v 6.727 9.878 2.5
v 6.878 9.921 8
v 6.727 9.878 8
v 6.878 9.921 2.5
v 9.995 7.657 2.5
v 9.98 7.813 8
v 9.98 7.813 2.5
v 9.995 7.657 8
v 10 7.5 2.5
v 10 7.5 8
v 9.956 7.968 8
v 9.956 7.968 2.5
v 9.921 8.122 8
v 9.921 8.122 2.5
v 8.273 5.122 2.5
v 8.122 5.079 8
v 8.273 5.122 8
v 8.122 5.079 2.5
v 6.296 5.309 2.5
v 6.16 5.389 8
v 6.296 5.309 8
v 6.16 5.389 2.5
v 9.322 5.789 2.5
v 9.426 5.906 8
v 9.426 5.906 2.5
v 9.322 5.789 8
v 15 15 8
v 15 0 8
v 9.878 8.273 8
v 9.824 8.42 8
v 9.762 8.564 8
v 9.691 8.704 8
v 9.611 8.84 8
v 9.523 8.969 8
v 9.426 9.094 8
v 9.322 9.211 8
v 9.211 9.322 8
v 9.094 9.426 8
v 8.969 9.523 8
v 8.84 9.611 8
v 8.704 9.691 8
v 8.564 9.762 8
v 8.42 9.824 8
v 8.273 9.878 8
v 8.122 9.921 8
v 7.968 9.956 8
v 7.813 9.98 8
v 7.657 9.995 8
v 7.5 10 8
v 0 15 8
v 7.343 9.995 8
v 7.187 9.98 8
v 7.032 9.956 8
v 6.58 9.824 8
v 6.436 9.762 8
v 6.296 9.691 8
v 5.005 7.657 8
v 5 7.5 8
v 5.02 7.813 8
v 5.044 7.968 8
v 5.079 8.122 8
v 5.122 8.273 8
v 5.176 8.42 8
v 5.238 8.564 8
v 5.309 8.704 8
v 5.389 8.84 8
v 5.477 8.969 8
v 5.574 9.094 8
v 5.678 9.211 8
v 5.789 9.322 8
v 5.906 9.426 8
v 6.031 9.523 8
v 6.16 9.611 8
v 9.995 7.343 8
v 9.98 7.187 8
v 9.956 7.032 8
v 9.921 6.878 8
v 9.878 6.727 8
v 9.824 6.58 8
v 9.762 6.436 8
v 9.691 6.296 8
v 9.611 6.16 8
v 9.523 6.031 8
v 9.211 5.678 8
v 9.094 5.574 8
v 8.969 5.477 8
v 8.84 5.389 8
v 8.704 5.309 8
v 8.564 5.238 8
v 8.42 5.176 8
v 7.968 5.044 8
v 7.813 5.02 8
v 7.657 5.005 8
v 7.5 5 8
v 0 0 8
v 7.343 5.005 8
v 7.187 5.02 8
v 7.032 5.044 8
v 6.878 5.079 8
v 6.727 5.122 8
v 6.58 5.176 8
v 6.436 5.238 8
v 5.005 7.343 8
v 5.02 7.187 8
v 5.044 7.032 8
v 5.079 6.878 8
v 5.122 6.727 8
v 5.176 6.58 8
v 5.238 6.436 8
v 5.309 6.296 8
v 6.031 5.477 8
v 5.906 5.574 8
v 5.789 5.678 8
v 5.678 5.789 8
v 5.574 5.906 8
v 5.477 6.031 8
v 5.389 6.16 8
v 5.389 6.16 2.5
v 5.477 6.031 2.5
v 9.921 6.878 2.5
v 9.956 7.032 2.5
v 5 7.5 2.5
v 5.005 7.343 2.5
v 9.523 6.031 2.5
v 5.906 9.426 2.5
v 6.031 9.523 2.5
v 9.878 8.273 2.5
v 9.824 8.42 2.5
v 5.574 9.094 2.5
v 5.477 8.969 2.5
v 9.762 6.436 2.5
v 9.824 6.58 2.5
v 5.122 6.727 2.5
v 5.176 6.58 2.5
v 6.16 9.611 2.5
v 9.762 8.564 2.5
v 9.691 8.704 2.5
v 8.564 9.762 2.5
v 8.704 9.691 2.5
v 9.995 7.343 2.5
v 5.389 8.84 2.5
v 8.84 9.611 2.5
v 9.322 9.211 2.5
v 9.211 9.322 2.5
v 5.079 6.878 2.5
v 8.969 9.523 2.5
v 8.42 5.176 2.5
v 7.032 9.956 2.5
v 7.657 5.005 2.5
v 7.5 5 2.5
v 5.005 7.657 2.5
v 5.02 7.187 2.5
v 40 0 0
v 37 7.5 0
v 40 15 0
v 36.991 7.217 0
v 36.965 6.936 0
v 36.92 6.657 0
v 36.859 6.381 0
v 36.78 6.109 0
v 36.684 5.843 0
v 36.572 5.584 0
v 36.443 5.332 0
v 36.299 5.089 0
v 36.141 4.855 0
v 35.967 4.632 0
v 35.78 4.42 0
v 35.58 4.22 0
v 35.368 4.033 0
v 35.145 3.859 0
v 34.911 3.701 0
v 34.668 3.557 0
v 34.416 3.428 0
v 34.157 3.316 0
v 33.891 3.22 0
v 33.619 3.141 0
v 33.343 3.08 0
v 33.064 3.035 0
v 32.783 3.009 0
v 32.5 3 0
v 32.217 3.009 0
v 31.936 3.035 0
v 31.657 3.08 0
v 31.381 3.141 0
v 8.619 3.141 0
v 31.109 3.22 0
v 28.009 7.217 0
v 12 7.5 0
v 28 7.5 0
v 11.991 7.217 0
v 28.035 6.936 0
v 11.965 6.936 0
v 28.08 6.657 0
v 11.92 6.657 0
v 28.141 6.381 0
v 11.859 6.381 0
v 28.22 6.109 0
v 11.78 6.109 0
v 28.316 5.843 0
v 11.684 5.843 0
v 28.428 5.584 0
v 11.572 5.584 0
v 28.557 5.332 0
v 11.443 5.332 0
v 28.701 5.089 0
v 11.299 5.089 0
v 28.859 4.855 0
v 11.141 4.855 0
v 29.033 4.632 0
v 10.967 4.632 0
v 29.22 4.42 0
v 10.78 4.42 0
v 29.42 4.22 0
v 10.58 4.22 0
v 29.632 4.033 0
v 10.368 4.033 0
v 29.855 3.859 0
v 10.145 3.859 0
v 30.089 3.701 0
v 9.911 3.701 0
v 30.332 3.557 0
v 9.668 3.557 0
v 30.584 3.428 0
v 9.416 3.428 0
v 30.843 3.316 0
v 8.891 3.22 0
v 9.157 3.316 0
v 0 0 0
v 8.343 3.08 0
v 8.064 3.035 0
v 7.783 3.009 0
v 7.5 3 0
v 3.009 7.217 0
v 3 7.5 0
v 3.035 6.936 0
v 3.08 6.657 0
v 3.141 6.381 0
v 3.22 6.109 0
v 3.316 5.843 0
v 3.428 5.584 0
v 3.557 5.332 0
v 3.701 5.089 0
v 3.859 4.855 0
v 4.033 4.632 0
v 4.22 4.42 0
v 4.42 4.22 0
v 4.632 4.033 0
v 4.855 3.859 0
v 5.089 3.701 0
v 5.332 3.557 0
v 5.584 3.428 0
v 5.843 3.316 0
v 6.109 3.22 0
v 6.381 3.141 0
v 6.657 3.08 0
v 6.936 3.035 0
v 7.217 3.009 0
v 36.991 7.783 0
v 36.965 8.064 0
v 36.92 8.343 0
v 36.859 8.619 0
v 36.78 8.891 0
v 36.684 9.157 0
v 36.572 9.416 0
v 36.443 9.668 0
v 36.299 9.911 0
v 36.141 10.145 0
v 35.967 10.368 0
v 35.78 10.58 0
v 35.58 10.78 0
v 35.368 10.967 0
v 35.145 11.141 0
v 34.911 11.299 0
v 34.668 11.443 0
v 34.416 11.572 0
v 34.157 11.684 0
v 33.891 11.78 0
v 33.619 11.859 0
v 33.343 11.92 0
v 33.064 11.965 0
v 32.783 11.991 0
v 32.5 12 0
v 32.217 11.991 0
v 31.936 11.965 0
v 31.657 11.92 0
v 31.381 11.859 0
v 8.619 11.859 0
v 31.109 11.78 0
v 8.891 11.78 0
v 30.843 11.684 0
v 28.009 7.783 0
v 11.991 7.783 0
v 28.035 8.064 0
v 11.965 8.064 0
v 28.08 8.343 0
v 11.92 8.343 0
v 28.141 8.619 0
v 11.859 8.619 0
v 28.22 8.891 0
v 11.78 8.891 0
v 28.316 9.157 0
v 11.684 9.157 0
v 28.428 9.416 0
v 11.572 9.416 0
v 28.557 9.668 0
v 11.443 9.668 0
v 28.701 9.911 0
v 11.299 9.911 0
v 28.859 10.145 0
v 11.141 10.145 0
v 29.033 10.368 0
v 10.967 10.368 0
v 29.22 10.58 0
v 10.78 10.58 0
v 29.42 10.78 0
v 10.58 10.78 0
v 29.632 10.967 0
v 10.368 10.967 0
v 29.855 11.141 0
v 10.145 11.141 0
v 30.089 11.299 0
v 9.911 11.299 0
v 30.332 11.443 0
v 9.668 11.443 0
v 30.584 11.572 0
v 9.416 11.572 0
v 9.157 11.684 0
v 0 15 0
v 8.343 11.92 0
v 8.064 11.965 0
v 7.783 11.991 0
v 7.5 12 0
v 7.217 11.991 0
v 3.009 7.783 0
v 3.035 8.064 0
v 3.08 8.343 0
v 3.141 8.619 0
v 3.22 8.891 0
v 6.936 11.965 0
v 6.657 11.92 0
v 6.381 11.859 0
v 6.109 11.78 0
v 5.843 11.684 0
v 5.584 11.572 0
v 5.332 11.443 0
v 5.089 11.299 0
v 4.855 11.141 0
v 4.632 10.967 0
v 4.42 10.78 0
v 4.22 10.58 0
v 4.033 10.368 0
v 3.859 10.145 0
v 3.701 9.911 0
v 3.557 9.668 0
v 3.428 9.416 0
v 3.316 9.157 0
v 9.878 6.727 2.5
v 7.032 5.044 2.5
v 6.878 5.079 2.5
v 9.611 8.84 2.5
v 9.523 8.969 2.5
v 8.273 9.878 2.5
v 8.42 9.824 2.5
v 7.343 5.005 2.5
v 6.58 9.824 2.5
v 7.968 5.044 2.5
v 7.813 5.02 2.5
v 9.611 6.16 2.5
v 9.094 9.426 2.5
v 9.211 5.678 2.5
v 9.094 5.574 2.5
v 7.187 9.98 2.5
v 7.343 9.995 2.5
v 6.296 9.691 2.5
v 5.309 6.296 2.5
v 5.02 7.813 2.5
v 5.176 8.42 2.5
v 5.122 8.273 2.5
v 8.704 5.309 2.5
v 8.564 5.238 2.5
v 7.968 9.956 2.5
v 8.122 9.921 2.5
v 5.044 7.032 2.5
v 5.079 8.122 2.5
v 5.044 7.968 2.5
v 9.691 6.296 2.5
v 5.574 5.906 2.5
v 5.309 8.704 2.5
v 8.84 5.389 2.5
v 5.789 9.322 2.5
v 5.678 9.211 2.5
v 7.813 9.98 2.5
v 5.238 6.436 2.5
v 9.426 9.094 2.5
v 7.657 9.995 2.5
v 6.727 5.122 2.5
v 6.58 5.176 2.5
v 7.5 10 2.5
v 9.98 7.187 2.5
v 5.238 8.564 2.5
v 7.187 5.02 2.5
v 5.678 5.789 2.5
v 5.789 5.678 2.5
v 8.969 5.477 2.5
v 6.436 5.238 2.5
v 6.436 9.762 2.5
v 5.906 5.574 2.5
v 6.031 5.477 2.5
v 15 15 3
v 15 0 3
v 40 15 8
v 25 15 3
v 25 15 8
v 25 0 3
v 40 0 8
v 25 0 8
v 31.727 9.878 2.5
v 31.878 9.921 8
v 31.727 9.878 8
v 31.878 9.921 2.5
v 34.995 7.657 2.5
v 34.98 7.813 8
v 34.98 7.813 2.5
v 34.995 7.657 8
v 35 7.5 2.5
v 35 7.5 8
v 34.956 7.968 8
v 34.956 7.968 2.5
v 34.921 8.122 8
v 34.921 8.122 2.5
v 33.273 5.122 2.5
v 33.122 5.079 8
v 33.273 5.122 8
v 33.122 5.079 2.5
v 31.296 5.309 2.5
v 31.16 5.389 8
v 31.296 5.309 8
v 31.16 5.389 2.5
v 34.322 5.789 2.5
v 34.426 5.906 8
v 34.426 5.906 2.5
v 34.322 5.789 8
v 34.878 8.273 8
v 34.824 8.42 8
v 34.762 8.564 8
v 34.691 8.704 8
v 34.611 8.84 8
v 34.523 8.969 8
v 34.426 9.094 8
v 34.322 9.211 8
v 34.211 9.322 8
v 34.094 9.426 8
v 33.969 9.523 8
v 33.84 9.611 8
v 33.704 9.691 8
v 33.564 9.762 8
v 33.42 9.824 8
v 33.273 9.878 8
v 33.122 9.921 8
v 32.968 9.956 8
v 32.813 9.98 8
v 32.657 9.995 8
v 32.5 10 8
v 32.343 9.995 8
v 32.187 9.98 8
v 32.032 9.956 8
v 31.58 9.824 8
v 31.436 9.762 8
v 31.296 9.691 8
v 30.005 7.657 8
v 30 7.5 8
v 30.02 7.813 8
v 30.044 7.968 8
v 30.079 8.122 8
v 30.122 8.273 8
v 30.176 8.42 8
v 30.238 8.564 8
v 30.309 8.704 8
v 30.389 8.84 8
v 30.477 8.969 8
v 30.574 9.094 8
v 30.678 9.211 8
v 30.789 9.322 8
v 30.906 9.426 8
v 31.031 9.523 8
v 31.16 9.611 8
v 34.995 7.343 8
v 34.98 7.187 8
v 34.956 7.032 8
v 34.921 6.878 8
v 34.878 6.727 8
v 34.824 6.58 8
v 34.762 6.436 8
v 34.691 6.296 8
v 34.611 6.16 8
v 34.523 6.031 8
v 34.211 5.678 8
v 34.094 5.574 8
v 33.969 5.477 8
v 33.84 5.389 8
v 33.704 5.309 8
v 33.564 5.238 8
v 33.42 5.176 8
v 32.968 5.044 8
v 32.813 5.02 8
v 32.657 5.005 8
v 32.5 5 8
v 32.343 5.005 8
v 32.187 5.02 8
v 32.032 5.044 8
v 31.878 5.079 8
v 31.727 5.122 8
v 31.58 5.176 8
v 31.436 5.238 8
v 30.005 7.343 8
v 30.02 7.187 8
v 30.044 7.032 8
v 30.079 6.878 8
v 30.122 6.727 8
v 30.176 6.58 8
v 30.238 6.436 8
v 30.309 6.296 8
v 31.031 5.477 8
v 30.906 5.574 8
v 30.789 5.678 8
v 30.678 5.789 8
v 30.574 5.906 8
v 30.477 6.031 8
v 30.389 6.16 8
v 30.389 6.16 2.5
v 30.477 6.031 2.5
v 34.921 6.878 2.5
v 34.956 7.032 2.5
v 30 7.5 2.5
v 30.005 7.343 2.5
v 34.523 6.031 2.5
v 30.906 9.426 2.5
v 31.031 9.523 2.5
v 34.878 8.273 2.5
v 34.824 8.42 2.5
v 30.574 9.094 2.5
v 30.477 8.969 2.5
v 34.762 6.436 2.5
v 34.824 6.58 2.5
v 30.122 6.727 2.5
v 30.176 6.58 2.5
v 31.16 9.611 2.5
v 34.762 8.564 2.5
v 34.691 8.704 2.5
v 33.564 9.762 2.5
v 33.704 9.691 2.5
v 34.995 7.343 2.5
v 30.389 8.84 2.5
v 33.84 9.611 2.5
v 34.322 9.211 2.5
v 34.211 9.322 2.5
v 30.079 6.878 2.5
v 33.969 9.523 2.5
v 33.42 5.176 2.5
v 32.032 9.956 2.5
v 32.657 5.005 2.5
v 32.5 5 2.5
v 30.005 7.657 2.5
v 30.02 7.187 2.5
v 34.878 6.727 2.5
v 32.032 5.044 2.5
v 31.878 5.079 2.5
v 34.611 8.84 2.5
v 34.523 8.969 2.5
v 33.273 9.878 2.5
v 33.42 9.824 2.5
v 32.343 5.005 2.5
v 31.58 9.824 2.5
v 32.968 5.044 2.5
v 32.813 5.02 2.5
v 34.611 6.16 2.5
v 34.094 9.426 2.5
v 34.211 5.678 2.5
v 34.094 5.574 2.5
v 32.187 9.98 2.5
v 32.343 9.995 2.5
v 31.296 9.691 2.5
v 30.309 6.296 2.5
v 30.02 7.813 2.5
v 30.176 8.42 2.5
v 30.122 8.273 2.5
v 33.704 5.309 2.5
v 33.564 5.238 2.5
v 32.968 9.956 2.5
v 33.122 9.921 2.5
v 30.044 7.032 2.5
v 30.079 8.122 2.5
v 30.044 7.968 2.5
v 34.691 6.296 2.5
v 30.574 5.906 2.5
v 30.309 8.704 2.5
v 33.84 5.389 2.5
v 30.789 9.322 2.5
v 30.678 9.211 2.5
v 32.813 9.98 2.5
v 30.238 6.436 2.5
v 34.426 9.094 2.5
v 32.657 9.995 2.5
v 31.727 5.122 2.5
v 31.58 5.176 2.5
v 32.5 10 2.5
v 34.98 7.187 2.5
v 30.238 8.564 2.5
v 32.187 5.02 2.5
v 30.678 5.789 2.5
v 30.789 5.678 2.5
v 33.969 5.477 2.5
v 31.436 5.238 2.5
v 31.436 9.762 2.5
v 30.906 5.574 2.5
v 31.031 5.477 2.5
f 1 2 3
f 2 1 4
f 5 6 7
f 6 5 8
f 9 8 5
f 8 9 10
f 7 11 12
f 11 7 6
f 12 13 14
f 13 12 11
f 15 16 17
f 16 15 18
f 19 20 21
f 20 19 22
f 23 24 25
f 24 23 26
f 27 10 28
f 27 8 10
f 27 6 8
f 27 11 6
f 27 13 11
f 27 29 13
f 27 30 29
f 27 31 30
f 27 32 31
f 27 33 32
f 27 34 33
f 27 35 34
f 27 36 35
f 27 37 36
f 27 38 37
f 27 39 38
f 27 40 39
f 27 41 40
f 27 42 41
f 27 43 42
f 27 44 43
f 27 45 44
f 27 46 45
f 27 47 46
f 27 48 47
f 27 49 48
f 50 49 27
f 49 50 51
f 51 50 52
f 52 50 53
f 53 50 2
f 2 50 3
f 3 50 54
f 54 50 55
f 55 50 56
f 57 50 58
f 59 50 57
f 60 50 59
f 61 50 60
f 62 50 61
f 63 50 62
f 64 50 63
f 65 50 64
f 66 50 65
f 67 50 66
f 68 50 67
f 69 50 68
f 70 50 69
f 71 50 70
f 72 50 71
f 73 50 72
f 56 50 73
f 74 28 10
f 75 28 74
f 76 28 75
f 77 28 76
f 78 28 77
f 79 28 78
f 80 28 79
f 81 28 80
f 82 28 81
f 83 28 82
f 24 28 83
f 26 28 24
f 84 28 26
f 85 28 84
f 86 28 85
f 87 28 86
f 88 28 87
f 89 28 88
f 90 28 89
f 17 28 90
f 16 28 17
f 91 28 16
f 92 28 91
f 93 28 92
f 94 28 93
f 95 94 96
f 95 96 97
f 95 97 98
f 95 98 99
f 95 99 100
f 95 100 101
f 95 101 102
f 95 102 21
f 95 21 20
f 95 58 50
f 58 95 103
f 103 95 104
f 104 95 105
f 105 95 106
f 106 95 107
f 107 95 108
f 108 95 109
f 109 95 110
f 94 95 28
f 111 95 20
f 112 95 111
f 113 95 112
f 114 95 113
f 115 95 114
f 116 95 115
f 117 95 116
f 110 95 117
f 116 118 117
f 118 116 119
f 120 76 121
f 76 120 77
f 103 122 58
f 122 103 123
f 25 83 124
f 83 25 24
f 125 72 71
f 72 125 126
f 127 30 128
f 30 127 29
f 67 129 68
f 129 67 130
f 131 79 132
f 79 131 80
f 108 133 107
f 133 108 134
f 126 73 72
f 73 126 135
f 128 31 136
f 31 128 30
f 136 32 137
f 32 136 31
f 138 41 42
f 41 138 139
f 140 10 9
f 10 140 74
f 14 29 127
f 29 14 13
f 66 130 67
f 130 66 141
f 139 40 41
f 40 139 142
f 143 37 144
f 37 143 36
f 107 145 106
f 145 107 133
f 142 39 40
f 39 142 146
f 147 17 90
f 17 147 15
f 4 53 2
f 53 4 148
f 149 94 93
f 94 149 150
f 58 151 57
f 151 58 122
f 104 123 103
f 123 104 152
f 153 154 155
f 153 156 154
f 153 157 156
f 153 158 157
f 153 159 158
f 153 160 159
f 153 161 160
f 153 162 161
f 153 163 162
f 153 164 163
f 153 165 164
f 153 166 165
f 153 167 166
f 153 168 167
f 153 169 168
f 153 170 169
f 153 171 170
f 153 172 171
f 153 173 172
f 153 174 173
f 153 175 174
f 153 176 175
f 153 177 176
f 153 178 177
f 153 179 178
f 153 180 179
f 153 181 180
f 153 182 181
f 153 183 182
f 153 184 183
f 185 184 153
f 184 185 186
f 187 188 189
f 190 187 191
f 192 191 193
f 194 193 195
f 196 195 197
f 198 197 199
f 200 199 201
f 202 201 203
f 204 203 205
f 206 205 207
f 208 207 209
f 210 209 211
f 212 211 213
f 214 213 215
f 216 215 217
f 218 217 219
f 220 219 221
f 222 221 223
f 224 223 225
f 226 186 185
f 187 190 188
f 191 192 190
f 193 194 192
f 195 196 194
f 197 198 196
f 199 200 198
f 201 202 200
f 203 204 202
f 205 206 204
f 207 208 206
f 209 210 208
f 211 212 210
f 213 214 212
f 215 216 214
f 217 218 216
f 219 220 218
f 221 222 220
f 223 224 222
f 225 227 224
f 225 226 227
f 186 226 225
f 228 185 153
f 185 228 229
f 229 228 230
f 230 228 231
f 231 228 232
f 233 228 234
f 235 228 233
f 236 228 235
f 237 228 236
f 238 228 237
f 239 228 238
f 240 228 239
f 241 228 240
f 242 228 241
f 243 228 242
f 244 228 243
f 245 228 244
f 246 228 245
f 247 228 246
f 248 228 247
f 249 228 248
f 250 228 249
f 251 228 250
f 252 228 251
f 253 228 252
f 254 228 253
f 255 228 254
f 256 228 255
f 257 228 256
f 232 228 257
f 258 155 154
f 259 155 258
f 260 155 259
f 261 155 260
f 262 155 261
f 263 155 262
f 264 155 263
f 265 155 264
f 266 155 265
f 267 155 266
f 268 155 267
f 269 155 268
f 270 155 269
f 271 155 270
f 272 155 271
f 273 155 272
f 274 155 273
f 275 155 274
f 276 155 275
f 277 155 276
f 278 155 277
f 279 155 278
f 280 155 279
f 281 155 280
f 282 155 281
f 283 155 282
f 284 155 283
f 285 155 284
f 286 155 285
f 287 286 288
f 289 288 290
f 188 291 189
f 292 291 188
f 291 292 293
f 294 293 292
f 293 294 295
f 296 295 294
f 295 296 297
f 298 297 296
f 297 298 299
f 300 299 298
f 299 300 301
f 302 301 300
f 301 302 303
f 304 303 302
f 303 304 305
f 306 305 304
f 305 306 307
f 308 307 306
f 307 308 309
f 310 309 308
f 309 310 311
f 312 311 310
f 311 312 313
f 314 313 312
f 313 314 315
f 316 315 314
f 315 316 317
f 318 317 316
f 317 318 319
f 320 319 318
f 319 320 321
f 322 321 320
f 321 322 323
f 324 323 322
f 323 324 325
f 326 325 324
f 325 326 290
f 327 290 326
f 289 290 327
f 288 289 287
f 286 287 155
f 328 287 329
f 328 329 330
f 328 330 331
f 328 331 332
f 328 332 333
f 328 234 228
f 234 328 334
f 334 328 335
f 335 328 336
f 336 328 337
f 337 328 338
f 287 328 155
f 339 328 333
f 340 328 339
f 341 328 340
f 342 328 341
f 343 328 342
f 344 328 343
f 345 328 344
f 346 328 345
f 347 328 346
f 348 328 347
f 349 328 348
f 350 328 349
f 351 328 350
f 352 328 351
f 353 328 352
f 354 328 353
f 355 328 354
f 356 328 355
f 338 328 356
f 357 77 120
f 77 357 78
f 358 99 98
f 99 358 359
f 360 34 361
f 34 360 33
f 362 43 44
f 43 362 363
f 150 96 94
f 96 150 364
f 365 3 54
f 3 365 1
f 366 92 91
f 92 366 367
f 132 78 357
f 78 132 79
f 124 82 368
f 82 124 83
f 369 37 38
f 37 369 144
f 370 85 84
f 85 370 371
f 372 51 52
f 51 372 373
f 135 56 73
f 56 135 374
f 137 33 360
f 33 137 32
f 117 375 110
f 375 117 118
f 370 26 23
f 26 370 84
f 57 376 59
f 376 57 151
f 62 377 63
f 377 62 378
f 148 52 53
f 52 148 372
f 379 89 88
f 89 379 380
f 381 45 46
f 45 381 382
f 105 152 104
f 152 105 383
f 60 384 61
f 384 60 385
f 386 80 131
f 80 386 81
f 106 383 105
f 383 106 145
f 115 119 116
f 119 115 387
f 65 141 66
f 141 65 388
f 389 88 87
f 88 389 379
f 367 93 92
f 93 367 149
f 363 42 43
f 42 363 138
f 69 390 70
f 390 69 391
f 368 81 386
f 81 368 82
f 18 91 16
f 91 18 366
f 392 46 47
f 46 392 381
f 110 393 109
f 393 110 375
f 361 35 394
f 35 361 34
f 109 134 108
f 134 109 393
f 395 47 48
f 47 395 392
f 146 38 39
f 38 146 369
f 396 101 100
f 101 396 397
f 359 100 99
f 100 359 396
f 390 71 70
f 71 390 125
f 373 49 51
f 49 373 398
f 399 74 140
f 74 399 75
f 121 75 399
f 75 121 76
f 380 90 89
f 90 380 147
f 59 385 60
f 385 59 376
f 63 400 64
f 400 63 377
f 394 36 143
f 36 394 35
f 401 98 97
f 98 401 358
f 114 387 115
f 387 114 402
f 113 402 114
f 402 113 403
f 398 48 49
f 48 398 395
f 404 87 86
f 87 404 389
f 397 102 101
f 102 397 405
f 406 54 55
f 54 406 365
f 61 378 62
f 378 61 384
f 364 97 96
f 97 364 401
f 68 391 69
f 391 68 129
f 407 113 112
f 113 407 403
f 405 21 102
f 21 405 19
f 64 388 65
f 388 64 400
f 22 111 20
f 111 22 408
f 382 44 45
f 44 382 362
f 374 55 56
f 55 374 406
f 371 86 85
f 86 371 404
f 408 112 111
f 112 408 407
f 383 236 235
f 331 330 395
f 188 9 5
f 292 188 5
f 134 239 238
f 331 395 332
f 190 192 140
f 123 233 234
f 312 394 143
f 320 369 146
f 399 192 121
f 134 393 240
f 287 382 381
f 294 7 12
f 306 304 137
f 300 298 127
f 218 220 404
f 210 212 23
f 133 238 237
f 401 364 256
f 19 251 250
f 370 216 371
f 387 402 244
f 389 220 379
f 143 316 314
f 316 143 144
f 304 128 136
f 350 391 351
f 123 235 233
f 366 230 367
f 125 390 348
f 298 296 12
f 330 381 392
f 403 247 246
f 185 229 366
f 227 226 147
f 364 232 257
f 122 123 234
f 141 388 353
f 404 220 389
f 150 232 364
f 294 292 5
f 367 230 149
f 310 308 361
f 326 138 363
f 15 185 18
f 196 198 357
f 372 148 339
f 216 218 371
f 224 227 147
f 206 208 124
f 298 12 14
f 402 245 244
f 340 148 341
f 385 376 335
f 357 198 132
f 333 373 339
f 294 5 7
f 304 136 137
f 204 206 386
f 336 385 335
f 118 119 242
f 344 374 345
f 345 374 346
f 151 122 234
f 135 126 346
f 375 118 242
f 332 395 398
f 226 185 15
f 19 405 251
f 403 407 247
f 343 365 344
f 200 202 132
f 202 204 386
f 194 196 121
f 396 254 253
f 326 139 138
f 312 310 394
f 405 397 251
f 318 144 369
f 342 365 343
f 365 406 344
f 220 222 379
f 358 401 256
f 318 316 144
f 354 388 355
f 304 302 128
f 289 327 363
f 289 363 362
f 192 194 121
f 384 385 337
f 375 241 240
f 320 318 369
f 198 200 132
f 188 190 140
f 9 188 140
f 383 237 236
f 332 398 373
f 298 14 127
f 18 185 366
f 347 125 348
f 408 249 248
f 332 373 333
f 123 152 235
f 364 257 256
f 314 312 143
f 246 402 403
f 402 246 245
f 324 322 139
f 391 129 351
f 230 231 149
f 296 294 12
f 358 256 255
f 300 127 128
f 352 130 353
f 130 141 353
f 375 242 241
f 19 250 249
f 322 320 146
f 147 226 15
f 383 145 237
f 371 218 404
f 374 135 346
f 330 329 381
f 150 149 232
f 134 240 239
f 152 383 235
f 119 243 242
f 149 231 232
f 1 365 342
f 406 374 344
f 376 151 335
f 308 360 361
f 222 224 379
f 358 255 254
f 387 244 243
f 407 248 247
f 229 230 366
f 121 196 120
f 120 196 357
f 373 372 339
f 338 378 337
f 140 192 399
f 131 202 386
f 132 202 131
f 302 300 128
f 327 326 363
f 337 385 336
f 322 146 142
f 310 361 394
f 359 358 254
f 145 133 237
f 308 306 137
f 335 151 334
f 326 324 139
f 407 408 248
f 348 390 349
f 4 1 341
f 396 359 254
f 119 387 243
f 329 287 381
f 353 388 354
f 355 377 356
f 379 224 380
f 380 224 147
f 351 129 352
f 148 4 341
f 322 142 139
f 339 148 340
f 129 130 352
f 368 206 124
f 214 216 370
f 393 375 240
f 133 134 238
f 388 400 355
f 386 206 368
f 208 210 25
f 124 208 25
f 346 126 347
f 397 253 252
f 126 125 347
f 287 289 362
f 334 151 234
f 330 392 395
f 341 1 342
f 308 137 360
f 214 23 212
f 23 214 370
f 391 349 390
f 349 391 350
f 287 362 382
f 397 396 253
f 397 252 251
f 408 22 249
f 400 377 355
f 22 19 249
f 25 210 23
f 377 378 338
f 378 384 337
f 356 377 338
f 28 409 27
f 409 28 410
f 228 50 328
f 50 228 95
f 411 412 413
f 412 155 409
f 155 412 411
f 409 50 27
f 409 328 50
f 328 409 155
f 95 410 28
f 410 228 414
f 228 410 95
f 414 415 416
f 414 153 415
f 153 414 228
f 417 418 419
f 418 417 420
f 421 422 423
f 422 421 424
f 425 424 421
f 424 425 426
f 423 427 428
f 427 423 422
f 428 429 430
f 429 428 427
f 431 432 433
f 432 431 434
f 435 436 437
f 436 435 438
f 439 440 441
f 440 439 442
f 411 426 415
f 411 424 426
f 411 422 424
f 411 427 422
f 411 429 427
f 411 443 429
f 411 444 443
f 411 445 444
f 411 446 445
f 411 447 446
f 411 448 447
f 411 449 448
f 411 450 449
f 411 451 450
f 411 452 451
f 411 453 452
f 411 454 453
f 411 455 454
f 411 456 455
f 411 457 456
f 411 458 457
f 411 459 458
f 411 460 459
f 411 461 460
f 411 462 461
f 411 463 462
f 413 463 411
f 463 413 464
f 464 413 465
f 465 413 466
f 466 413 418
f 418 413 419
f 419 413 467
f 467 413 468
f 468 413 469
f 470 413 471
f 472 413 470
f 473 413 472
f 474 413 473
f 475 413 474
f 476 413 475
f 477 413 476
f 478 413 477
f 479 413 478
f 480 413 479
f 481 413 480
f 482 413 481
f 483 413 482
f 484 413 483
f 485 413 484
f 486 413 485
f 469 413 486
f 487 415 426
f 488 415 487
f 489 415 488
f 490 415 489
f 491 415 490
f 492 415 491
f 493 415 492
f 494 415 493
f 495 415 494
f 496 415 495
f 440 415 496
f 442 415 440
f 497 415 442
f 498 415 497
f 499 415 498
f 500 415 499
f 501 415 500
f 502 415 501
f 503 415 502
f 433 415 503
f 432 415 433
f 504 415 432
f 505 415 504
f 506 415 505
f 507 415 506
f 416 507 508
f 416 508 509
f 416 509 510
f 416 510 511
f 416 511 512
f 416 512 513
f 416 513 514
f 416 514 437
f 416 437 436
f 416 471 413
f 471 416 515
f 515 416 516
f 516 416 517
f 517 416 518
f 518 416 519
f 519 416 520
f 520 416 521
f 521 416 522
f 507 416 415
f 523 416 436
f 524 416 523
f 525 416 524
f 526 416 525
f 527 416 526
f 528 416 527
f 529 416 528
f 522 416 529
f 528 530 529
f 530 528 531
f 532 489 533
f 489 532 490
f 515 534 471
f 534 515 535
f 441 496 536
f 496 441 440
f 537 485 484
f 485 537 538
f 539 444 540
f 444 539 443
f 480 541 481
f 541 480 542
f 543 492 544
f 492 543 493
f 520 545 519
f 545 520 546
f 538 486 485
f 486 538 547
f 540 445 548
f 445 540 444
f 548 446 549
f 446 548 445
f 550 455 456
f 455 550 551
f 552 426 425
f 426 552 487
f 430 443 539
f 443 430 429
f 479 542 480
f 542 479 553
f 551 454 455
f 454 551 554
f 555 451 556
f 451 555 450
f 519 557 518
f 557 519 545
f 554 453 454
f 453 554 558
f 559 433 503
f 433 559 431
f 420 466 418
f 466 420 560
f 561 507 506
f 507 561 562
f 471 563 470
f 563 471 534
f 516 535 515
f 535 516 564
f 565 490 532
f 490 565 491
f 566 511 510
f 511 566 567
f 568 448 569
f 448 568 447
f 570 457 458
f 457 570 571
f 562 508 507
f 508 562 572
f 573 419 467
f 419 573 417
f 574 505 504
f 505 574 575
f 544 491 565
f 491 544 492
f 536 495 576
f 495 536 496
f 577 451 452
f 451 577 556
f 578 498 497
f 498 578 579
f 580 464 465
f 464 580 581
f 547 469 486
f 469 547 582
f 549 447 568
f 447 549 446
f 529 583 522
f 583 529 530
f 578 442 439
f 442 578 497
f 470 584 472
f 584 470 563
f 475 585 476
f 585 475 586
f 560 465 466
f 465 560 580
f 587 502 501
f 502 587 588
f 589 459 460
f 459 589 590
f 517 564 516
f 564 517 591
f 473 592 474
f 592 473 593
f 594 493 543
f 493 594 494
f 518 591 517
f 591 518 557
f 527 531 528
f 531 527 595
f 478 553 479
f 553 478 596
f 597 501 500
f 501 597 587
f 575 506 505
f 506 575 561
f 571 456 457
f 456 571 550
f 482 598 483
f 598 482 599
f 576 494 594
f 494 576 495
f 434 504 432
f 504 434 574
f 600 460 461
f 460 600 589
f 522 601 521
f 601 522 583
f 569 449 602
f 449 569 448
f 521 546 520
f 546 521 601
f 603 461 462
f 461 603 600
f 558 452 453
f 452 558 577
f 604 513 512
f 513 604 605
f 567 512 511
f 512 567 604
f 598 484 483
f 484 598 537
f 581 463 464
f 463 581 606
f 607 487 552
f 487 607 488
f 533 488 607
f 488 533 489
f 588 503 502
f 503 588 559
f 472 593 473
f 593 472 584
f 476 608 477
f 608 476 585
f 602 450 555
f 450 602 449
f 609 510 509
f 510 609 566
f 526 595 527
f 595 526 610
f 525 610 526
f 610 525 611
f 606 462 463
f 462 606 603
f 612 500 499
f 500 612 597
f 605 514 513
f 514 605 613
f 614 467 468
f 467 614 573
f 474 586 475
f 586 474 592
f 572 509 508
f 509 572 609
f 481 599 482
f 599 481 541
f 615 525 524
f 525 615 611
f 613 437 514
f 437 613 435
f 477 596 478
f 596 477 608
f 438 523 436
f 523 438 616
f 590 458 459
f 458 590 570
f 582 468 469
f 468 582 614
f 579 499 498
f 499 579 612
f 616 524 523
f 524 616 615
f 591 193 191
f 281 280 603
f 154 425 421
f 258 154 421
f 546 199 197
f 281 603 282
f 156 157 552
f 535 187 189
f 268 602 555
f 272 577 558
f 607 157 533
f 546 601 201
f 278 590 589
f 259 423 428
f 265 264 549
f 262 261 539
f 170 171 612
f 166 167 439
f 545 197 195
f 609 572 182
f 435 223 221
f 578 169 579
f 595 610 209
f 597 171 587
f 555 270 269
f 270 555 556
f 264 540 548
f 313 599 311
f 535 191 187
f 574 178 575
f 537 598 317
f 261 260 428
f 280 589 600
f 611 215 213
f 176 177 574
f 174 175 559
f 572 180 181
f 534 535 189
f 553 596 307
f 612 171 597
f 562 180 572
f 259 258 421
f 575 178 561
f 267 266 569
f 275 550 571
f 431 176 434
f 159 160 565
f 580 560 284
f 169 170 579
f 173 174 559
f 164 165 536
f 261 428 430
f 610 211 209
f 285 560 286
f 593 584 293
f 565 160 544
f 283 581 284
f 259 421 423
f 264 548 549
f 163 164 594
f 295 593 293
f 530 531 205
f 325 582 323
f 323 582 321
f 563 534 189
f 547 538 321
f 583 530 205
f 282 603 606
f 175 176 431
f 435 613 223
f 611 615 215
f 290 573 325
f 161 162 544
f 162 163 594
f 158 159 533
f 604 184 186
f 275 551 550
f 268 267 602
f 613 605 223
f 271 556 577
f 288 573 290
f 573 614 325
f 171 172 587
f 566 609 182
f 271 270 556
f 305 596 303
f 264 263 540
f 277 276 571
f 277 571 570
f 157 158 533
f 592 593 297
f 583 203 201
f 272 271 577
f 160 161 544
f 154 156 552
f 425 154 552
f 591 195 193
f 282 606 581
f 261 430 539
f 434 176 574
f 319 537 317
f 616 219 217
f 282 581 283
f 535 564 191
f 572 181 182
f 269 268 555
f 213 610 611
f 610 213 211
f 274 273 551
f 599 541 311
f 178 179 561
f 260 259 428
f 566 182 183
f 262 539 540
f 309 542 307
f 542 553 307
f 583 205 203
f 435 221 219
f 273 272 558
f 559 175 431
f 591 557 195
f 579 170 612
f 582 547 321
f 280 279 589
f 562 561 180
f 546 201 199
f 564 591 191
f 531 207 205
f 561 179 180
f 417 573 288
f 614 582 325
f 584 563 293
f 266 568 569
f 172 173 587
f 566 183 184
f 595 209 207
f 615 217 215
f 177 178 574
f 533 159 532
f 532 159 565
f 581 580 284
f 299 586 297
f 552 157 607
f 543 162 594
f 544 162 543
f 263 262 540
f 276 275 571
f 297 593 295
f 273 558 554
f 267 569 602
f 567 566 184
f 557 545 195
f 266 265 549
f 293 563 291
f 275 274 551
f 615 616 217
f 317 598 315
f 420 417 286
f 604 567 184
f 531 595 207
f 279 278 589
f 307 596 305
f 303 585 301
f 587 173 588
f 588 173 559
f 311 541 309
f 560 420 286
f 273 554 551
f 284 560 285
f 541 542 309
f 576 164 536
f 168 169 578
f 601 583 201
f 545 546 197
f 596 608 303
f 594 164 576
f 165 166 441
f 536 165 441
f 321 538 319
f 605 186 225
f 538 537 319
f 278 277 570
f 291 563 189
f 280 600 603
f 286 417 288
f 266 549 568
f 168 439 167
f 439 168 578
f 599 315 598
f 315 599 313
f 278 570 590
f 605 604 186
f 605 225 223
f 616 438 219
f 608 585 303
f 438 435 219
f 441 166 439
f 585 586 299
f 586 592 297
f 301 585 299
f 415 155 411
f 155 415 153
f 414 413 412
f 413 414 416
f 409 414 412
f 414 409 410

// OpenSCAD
width = 10;

screw_length = 16;
screw_diameter = 5;
screw_head_diameter = 9;
screw_head_height = 2.5;

hole_depth = 8;

$fn = 100;
t = 3;

w = screw_head_diameter + t * 2;
h = screw_length - hole_depth;

difference() {
  cube([w, w, h]);
  translate([w * 0.5, w * 0.5, 0]) {
    cylinder(h = h, d = screw_diameter);
    cylinder(h = screw_head_height, d1 = screw_head_diameter, d2 = screw_diameter);
  }
}

translate([w + width, 0, 0]) difference() {
  cube([w, w, h]);
  translate([w * 0.5, w * 0.5, 0]) {
    cylinder(h = h, d = screw_diameter);
    cylinder(h = screw_head_height, d1 = screw_head_diameter, d2 = screw_diameter);
  }
}

translate([w, 0, 0]) cube([width, w, t]);
